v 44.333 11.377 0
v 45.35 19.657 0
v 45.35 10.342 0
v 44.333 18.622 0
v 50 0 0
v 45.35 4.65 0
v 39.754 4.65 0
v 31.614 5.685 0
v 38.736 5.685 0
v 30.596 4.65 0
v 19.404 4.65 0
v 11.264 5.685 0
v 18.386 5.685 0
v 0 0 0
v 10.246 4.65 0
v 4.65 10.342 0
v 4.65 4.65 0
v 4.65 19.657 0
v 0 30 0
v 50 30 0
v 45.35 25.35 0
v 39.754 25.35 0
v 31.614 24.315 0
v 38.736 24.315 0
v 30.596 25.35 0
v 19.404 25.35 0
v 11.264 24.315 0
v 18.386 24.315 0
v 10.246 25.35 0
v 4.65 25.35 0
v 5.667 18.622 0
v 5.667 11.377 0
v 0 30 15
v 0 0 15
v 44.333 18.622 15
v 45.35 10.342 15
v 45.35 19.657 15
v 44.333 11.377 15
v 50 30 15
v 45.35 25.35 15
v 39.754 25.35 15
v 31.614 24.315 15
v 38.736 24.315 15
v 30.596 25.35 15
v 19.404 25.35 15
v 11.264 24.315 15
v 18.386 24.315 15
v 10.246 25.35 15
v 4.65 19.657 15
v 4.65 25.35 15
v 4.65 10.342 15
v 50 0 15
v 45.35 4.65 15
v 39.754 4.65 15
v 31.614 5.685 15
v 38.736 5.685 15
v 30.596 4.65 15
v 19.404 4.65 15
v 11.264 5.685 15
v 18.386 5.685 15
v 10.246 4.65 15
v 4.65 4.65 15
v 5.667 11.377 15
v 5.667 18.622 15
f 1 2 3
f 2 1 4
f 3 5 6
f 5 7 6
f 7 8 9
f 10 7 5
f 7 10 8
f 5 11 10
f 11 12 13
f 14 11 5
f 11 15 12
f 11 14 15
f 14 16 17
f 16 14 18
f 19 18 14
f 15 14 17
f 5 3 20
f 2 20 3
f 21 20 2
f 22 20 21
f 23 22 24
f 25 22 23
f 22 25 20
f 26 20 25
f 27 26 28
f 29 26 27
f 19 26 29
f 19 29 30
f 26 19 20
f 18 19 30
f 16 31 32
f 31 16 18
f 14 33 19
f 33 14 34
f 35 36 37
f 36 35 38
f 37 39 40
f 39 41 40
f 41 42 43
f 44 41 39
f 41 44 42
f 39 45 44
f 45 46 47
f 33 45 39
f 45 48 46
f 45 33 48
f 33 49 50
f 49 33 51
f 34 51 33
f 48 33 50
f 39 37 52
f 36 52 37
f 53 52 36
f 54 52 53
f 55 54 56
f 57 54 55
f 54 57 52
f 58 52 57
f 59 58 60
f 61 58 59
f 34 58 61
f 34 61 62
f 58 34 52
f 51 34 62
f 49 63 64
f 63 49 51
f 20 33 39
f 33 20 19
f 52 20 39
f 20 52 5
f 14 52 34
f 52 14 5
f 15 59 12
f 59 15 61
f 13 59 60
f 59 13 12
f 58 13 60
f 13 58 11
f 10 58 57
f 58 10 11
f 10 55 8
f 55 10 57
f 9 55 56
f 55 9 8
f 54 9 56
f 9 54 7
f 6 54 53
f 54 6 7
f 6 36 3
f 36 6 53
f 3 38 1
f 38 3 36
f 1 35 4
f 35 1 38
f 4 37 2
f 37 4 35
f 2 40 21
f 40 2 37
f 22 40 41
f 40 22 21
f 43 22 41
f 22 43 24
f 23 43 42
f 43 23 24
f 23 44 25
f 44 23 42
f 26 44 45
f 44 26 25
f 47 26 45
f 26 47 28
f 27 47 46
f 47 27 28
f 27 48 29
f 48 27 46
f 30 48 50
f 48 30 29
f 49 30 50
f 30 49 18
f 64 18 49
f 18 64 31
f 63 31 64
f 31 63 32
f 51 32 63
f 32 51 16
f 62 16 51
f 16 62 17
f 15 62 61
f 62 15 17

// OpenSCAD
// file: constants.scad
tolerance=0.7;
oversize = 0.7;
lengthHoleSpacing=20;
wallWidth=5;
vslotIndentHeight=1;
indentWidthOutside = 9;
indentWidthInside = 7;
sectionWidth=20;
profileSize=20;
sectionCountWidth = 2;
sectionCountDepth = 1;
extrusionWidth=profileSize*sectionCountWidth;
extrusionDepth=profileSize*sectionCountDepth;
nema17Width = 42.3;
nema17HoleRadius = 11.05 + tolerance/2;
nema17Height = 3.5*extrusionWidth;
nema17BoltSpacing = 31;
nema17BeltHoleHeight = 8;
nema17BeltOffsetFromTopExtrusion = 8;
nema17BeltHeightWidth = 15;
wallSpacing=5;
screwHeight = wallSpacing+vslotIndentHeight;
// main file
include<constants.scad>;

testPiece=true;
if (testPiece) {
    zExtrusionLength = 15;
    zExtrusionWidthSections = 2;
    zExtrusionDepthSections = 1;
    difference() {
        linear_extrude(height=zExtrusionLength)
            square([
                sectionWidth*zExtrusionWidthSections+wallWidth*2,
                sectionWidth*zExtrusionDepthSections+wallWidth*2
            ]);
        translate([wallWidth, wallWidth, 0]) {
            linear_extrude(height=zExtrusionLength)
            VSlot2dProfile(
                sectionCountWidth=zExtrusionWidthSections, 
                sectionCountDepth=zExtrusionDepthSections,
                indentHeight=vslotIndentHeight,
                oversize=oversize
            );
        }; 
        /*
        negativeSpaceHoles(
            extrusionLength=zExtrusionLength,
            fullIndentHeight=wallWidth+vslotIndentHeight,
            firstIndentOffset=wallWidth,
            widthSections=zExtrusionWidthSections,
            lengthHoleSpacing=lengthHoleSpacing
        );*/        
    };
}

module extrusionIndent(_indentWidthInside, _indentWidthOutside, _indentHeight) {
    polygon(points=[
            [0,0], 
            [(_indentWidthOutside-_indentWidthInside)/2, _indentHeight], 
            [_indentWidthInside + (_indentWidthOutside-_indentWidthInside)/2, _indentHeight],
            [_indentWidthOutside, 0]
        ]);
};

module VSlot2dProfile(
    extrusionLength,
    sectionWidth = 20,
    indentHeight = vslotIndentHeight,
    sectionCountWidth,
    sectionCountDepth,
    topIndent = true,
    bottomIndent = true,
    leftIndent = true,
    rightIndent = true,
    oversize = 0
)
{
    translate([-oversize/2,-oversize/2,-oversize/2])
    resize([
        sectionWidth*sectionCountWidth+oversize,
        sectionWidth*sectionCountDepth+oversize,
        extrusionLength+oversize
    ]) difference() {
        
            square(
                size=[
                    sectionWidth*sectionCountWidth, 
                    sectionWidth*sectionCountDepth
                ]
            );
        for(i = [0:sectionCountWidth]) {
            // bottom indents
            if (bottomIndent) 
                translate([i * sectionWidth + (sectionWidth-indentWidthOutside)/2, 0, 0])
                extrusionIndent(indentWidthInside,indentWidthOutside,indentHeight);
            
            // top indents
            if (topIndent)
                translate([
                    i * sectionWidth + (sectionWidth-indentWidthOutside)/2, 
                    sectionWidth*sectionCountDepth, 
                    0
                ])
                rotate([180,0,0])
                extrusionIndent(indentWidthInside,indentWidthOutside,indentHeight);
        }
        for(i = [0:sectionCountDepth]) {
            // left side indent
            if (leftIndent)
                translate([0, (i+1) * sectionWidth - (sectionWidth-indentWidthOutside)/2, 0])
                rotate([0,0,-90]) 
                extrusionIndent(indentWidthInside,indentWidthOutside,indentHeight);
            
            // right side inden
            if (rightIndent)
                translate([
                    sectionWidth*sectionCountWidth, 
                    i * sectionWidth + (sectionWidth-indentWidthOutside)/2, 
                    0
                ])
                rotate([0,0,90]) 
                extrusionIndent(indentWidthInside,indentWidthOutside,indentHeight);
        }
    }
};


module negativeSpaceHole(
    largeHoleIndent = largeHoleIndent,
    fullIndentHeight = wallSpacing+vslotIndentHeight,
    largeHoleRadius = 5,
    smallHoleRadius = 2.5,
    )
{ 
    cylinder(h=largeHoleHeight,r=largeHoleRadius,center=false, $fn=90);
    cylinder(h=fullIndentHeight,r=smallHoleRadius,center=false, $fn=90);
}

module negativeSpaceHolePoints(
    largeHoleIndent = 1,
    largeHoleRadius = 5,
    smallHoleRadius = 2.5,
    fullIndentHeight,
    points = []
    )
{
    for (i=[0:len(points)-1]){
        translate([points[i][1],0,points[i][0]]) {
            rotate([-90,0,0]) {
                echo(points[i][0], points[i][1]);
                negativeSpaceHole(
                    largeHoleHeight=largeHoleIndent,
                    fullIndentHeight=fullIndentHeight,
                    largeHoleRadius=largeHoleRadius,
                    smallHoleRadius=smallHoleRadius);
            };
        }
    }
}

module negativeSpaceHoles(
    largeHoleIndent = 1,
    largeHoleRadius = 5,
    smallHoleRadius = 2.5,
    widthHoleSpacing = 20,
    fullIndentHeight,
    lengthHoleSpacing,
    extrusionLength,
    firstIndentOffset,
    widthSections
    ) 
{
    
    negativeSpaceHolePoints(
        largeHoleIndent = largeHoleIndent,
        largeHoleRadius = largeHoleRadius,
        smallHoleRadius = smallHoleRadius,
        fullIndentHeight = fullIndentHeight,
        lengthHoleSpacing = lengthHoleSpacing,
        widthSections = widthSections,
        points=[ 
            for (p = [lengthHoleSpacing/2+firstIndentOffset:lengthHoleSpacing:extrusionLength-firstIndentOffset-lengthHoleSpacing/2]) 
            for (s = [firstIndentOffset+widthHoleSpacing/2:widthHoleSpacing:widthHoleSpacing*widthSections]) 
            [p,s]
         ]
            
    );
}


module drawVslotExtrusion(
    height, 
    sectionCountWidth, 
    sectionCountDepth, 
    topIndent=true, 
    rightIndent=true, 
    leftIndent=true, 
    bottomIndent=true, 
    oversize=0,
    screwHeight=screwHeight,
    screwOffset=0,
    leftScrewPoints = [],
    rightScrewPoints = [], 
    topScrewPoints = [],
    bottomScrewPoints = [],
    backScrewPoints = []
    ) 
{
    linear_extrude(height=height) 
        VSlot2dProfile(
            sectionCountWidth=sectionCountWidth,
            sectionCountDepth=sectionCountDepth,
            topIndent=topIndent,
            bottomIndent= bottomIndent,
            leftIndent=leftIndent,
            rightIndent=rightIndent,
            oversize=oversize);
    
    if (len(topScrewPoints) > 0) {
        points = [ 
            for(i = [0:len(topScrewPoints)-1])
            for(j=[profileSize/2:profileSize:sectionCountWidth*profileSize])
            [topScrewPoints[i],j]
        ];
            translate([0,-screwHeight+vslotIndentHeight,0])
        negativeSpaceHolePoints(
            largeHoleIndent = screwHeight-screwOffset,
            fullIndentHeight=screwHeight,
            points = points
        );
    };
    if (len(bottomScrewPoints) > 0) {
        points = [ 
            for(i = [0:len(bottomScrewPoints)-1])
            for(j=[profileSize/2:profileSize:sectionCountWidth*profileSize])
            [height-bottomScrewPoints[i],j]
        ];
            translate([0,screwHeight+sectionCountDepth*profileSize-vslotIndentHeight,height])
            rotate([180,0,0])
        negativeSpaceHolePoints(
            largeHoleIndent = screwHeight-screwOffset,
            fullIndentHeight=screwHeight+oversize,
            points = points
        );
    };
    if (len(leftScrewPoints) > 0) {
        points = [ 
            for(i = [0:len(leftScrewPoints)-1])
            for(j=[profileSize/2:profileSize:sectionCountDepth*profileSize])
            [leftScrewPoints[i],j]
        ];
            translate([-screwHeight+vslotIndentHeight,sectionCountDepth*profileSize,0])
            rotate([0,0,-90])
        negativeSpaceHolePoints(
            largeHoleIndent = screwHeight-screwOffset,
            fullIndentHeight=screwHeight+oversize,
            points = points
        );
    };
    if (len(rightScrewPoints) > 0) {
        points = [ 
            for(i = [0:len(rightScrewPoints)-1])
            for(j=[profileSize/2:profileSize:sectionCountDepth*profileSize])
            [rightScrewPoints[i],j]
        ];
            translate([sectionCountWidth*profileSize+screwHeight-vslotIndentHeight,0,0])
            rotate([0,0,90])
        negativeSpaceHolePoints(
            largeHoleIndent = screwHeight-screwOffset,
            fullIndentHeight=screwHeight+oversize,
            points = points
        );
    };
    if (len(backScrewPoints) > 0) {
        points = [ 
            for(i = [0:len(backScrewPoints)-1])
            for(j=[profileSize/2:profileSize:sectionCountWidth*profileSize])
            [backScrewPoints[i],j]
        ];
            translate([0,sectionCountDepth*profileSize,-screwHeight+vslotIndentHeight])
            rotate([90,0,0])
        negativeSpaceHolePoints(
            largeHoleIndent = screwHeight-screwOffset,
            fullIndentHeight=screwHeight,
            points = points
        );
    };
    /*
        translate([profileSize/2,0,0])
        for(i = [0:len(leftScrewPoints)])
        for(j=[0:profileSize:sectionCountDepth*profileSize]) {
            translate([0,leftScrewPoints[i]],j) 
                negativeSpaceHole(largeHoleHeight = screwHeight-screwOffset, fullIndentHeight = screwHeight);
            }
    */
}


        
